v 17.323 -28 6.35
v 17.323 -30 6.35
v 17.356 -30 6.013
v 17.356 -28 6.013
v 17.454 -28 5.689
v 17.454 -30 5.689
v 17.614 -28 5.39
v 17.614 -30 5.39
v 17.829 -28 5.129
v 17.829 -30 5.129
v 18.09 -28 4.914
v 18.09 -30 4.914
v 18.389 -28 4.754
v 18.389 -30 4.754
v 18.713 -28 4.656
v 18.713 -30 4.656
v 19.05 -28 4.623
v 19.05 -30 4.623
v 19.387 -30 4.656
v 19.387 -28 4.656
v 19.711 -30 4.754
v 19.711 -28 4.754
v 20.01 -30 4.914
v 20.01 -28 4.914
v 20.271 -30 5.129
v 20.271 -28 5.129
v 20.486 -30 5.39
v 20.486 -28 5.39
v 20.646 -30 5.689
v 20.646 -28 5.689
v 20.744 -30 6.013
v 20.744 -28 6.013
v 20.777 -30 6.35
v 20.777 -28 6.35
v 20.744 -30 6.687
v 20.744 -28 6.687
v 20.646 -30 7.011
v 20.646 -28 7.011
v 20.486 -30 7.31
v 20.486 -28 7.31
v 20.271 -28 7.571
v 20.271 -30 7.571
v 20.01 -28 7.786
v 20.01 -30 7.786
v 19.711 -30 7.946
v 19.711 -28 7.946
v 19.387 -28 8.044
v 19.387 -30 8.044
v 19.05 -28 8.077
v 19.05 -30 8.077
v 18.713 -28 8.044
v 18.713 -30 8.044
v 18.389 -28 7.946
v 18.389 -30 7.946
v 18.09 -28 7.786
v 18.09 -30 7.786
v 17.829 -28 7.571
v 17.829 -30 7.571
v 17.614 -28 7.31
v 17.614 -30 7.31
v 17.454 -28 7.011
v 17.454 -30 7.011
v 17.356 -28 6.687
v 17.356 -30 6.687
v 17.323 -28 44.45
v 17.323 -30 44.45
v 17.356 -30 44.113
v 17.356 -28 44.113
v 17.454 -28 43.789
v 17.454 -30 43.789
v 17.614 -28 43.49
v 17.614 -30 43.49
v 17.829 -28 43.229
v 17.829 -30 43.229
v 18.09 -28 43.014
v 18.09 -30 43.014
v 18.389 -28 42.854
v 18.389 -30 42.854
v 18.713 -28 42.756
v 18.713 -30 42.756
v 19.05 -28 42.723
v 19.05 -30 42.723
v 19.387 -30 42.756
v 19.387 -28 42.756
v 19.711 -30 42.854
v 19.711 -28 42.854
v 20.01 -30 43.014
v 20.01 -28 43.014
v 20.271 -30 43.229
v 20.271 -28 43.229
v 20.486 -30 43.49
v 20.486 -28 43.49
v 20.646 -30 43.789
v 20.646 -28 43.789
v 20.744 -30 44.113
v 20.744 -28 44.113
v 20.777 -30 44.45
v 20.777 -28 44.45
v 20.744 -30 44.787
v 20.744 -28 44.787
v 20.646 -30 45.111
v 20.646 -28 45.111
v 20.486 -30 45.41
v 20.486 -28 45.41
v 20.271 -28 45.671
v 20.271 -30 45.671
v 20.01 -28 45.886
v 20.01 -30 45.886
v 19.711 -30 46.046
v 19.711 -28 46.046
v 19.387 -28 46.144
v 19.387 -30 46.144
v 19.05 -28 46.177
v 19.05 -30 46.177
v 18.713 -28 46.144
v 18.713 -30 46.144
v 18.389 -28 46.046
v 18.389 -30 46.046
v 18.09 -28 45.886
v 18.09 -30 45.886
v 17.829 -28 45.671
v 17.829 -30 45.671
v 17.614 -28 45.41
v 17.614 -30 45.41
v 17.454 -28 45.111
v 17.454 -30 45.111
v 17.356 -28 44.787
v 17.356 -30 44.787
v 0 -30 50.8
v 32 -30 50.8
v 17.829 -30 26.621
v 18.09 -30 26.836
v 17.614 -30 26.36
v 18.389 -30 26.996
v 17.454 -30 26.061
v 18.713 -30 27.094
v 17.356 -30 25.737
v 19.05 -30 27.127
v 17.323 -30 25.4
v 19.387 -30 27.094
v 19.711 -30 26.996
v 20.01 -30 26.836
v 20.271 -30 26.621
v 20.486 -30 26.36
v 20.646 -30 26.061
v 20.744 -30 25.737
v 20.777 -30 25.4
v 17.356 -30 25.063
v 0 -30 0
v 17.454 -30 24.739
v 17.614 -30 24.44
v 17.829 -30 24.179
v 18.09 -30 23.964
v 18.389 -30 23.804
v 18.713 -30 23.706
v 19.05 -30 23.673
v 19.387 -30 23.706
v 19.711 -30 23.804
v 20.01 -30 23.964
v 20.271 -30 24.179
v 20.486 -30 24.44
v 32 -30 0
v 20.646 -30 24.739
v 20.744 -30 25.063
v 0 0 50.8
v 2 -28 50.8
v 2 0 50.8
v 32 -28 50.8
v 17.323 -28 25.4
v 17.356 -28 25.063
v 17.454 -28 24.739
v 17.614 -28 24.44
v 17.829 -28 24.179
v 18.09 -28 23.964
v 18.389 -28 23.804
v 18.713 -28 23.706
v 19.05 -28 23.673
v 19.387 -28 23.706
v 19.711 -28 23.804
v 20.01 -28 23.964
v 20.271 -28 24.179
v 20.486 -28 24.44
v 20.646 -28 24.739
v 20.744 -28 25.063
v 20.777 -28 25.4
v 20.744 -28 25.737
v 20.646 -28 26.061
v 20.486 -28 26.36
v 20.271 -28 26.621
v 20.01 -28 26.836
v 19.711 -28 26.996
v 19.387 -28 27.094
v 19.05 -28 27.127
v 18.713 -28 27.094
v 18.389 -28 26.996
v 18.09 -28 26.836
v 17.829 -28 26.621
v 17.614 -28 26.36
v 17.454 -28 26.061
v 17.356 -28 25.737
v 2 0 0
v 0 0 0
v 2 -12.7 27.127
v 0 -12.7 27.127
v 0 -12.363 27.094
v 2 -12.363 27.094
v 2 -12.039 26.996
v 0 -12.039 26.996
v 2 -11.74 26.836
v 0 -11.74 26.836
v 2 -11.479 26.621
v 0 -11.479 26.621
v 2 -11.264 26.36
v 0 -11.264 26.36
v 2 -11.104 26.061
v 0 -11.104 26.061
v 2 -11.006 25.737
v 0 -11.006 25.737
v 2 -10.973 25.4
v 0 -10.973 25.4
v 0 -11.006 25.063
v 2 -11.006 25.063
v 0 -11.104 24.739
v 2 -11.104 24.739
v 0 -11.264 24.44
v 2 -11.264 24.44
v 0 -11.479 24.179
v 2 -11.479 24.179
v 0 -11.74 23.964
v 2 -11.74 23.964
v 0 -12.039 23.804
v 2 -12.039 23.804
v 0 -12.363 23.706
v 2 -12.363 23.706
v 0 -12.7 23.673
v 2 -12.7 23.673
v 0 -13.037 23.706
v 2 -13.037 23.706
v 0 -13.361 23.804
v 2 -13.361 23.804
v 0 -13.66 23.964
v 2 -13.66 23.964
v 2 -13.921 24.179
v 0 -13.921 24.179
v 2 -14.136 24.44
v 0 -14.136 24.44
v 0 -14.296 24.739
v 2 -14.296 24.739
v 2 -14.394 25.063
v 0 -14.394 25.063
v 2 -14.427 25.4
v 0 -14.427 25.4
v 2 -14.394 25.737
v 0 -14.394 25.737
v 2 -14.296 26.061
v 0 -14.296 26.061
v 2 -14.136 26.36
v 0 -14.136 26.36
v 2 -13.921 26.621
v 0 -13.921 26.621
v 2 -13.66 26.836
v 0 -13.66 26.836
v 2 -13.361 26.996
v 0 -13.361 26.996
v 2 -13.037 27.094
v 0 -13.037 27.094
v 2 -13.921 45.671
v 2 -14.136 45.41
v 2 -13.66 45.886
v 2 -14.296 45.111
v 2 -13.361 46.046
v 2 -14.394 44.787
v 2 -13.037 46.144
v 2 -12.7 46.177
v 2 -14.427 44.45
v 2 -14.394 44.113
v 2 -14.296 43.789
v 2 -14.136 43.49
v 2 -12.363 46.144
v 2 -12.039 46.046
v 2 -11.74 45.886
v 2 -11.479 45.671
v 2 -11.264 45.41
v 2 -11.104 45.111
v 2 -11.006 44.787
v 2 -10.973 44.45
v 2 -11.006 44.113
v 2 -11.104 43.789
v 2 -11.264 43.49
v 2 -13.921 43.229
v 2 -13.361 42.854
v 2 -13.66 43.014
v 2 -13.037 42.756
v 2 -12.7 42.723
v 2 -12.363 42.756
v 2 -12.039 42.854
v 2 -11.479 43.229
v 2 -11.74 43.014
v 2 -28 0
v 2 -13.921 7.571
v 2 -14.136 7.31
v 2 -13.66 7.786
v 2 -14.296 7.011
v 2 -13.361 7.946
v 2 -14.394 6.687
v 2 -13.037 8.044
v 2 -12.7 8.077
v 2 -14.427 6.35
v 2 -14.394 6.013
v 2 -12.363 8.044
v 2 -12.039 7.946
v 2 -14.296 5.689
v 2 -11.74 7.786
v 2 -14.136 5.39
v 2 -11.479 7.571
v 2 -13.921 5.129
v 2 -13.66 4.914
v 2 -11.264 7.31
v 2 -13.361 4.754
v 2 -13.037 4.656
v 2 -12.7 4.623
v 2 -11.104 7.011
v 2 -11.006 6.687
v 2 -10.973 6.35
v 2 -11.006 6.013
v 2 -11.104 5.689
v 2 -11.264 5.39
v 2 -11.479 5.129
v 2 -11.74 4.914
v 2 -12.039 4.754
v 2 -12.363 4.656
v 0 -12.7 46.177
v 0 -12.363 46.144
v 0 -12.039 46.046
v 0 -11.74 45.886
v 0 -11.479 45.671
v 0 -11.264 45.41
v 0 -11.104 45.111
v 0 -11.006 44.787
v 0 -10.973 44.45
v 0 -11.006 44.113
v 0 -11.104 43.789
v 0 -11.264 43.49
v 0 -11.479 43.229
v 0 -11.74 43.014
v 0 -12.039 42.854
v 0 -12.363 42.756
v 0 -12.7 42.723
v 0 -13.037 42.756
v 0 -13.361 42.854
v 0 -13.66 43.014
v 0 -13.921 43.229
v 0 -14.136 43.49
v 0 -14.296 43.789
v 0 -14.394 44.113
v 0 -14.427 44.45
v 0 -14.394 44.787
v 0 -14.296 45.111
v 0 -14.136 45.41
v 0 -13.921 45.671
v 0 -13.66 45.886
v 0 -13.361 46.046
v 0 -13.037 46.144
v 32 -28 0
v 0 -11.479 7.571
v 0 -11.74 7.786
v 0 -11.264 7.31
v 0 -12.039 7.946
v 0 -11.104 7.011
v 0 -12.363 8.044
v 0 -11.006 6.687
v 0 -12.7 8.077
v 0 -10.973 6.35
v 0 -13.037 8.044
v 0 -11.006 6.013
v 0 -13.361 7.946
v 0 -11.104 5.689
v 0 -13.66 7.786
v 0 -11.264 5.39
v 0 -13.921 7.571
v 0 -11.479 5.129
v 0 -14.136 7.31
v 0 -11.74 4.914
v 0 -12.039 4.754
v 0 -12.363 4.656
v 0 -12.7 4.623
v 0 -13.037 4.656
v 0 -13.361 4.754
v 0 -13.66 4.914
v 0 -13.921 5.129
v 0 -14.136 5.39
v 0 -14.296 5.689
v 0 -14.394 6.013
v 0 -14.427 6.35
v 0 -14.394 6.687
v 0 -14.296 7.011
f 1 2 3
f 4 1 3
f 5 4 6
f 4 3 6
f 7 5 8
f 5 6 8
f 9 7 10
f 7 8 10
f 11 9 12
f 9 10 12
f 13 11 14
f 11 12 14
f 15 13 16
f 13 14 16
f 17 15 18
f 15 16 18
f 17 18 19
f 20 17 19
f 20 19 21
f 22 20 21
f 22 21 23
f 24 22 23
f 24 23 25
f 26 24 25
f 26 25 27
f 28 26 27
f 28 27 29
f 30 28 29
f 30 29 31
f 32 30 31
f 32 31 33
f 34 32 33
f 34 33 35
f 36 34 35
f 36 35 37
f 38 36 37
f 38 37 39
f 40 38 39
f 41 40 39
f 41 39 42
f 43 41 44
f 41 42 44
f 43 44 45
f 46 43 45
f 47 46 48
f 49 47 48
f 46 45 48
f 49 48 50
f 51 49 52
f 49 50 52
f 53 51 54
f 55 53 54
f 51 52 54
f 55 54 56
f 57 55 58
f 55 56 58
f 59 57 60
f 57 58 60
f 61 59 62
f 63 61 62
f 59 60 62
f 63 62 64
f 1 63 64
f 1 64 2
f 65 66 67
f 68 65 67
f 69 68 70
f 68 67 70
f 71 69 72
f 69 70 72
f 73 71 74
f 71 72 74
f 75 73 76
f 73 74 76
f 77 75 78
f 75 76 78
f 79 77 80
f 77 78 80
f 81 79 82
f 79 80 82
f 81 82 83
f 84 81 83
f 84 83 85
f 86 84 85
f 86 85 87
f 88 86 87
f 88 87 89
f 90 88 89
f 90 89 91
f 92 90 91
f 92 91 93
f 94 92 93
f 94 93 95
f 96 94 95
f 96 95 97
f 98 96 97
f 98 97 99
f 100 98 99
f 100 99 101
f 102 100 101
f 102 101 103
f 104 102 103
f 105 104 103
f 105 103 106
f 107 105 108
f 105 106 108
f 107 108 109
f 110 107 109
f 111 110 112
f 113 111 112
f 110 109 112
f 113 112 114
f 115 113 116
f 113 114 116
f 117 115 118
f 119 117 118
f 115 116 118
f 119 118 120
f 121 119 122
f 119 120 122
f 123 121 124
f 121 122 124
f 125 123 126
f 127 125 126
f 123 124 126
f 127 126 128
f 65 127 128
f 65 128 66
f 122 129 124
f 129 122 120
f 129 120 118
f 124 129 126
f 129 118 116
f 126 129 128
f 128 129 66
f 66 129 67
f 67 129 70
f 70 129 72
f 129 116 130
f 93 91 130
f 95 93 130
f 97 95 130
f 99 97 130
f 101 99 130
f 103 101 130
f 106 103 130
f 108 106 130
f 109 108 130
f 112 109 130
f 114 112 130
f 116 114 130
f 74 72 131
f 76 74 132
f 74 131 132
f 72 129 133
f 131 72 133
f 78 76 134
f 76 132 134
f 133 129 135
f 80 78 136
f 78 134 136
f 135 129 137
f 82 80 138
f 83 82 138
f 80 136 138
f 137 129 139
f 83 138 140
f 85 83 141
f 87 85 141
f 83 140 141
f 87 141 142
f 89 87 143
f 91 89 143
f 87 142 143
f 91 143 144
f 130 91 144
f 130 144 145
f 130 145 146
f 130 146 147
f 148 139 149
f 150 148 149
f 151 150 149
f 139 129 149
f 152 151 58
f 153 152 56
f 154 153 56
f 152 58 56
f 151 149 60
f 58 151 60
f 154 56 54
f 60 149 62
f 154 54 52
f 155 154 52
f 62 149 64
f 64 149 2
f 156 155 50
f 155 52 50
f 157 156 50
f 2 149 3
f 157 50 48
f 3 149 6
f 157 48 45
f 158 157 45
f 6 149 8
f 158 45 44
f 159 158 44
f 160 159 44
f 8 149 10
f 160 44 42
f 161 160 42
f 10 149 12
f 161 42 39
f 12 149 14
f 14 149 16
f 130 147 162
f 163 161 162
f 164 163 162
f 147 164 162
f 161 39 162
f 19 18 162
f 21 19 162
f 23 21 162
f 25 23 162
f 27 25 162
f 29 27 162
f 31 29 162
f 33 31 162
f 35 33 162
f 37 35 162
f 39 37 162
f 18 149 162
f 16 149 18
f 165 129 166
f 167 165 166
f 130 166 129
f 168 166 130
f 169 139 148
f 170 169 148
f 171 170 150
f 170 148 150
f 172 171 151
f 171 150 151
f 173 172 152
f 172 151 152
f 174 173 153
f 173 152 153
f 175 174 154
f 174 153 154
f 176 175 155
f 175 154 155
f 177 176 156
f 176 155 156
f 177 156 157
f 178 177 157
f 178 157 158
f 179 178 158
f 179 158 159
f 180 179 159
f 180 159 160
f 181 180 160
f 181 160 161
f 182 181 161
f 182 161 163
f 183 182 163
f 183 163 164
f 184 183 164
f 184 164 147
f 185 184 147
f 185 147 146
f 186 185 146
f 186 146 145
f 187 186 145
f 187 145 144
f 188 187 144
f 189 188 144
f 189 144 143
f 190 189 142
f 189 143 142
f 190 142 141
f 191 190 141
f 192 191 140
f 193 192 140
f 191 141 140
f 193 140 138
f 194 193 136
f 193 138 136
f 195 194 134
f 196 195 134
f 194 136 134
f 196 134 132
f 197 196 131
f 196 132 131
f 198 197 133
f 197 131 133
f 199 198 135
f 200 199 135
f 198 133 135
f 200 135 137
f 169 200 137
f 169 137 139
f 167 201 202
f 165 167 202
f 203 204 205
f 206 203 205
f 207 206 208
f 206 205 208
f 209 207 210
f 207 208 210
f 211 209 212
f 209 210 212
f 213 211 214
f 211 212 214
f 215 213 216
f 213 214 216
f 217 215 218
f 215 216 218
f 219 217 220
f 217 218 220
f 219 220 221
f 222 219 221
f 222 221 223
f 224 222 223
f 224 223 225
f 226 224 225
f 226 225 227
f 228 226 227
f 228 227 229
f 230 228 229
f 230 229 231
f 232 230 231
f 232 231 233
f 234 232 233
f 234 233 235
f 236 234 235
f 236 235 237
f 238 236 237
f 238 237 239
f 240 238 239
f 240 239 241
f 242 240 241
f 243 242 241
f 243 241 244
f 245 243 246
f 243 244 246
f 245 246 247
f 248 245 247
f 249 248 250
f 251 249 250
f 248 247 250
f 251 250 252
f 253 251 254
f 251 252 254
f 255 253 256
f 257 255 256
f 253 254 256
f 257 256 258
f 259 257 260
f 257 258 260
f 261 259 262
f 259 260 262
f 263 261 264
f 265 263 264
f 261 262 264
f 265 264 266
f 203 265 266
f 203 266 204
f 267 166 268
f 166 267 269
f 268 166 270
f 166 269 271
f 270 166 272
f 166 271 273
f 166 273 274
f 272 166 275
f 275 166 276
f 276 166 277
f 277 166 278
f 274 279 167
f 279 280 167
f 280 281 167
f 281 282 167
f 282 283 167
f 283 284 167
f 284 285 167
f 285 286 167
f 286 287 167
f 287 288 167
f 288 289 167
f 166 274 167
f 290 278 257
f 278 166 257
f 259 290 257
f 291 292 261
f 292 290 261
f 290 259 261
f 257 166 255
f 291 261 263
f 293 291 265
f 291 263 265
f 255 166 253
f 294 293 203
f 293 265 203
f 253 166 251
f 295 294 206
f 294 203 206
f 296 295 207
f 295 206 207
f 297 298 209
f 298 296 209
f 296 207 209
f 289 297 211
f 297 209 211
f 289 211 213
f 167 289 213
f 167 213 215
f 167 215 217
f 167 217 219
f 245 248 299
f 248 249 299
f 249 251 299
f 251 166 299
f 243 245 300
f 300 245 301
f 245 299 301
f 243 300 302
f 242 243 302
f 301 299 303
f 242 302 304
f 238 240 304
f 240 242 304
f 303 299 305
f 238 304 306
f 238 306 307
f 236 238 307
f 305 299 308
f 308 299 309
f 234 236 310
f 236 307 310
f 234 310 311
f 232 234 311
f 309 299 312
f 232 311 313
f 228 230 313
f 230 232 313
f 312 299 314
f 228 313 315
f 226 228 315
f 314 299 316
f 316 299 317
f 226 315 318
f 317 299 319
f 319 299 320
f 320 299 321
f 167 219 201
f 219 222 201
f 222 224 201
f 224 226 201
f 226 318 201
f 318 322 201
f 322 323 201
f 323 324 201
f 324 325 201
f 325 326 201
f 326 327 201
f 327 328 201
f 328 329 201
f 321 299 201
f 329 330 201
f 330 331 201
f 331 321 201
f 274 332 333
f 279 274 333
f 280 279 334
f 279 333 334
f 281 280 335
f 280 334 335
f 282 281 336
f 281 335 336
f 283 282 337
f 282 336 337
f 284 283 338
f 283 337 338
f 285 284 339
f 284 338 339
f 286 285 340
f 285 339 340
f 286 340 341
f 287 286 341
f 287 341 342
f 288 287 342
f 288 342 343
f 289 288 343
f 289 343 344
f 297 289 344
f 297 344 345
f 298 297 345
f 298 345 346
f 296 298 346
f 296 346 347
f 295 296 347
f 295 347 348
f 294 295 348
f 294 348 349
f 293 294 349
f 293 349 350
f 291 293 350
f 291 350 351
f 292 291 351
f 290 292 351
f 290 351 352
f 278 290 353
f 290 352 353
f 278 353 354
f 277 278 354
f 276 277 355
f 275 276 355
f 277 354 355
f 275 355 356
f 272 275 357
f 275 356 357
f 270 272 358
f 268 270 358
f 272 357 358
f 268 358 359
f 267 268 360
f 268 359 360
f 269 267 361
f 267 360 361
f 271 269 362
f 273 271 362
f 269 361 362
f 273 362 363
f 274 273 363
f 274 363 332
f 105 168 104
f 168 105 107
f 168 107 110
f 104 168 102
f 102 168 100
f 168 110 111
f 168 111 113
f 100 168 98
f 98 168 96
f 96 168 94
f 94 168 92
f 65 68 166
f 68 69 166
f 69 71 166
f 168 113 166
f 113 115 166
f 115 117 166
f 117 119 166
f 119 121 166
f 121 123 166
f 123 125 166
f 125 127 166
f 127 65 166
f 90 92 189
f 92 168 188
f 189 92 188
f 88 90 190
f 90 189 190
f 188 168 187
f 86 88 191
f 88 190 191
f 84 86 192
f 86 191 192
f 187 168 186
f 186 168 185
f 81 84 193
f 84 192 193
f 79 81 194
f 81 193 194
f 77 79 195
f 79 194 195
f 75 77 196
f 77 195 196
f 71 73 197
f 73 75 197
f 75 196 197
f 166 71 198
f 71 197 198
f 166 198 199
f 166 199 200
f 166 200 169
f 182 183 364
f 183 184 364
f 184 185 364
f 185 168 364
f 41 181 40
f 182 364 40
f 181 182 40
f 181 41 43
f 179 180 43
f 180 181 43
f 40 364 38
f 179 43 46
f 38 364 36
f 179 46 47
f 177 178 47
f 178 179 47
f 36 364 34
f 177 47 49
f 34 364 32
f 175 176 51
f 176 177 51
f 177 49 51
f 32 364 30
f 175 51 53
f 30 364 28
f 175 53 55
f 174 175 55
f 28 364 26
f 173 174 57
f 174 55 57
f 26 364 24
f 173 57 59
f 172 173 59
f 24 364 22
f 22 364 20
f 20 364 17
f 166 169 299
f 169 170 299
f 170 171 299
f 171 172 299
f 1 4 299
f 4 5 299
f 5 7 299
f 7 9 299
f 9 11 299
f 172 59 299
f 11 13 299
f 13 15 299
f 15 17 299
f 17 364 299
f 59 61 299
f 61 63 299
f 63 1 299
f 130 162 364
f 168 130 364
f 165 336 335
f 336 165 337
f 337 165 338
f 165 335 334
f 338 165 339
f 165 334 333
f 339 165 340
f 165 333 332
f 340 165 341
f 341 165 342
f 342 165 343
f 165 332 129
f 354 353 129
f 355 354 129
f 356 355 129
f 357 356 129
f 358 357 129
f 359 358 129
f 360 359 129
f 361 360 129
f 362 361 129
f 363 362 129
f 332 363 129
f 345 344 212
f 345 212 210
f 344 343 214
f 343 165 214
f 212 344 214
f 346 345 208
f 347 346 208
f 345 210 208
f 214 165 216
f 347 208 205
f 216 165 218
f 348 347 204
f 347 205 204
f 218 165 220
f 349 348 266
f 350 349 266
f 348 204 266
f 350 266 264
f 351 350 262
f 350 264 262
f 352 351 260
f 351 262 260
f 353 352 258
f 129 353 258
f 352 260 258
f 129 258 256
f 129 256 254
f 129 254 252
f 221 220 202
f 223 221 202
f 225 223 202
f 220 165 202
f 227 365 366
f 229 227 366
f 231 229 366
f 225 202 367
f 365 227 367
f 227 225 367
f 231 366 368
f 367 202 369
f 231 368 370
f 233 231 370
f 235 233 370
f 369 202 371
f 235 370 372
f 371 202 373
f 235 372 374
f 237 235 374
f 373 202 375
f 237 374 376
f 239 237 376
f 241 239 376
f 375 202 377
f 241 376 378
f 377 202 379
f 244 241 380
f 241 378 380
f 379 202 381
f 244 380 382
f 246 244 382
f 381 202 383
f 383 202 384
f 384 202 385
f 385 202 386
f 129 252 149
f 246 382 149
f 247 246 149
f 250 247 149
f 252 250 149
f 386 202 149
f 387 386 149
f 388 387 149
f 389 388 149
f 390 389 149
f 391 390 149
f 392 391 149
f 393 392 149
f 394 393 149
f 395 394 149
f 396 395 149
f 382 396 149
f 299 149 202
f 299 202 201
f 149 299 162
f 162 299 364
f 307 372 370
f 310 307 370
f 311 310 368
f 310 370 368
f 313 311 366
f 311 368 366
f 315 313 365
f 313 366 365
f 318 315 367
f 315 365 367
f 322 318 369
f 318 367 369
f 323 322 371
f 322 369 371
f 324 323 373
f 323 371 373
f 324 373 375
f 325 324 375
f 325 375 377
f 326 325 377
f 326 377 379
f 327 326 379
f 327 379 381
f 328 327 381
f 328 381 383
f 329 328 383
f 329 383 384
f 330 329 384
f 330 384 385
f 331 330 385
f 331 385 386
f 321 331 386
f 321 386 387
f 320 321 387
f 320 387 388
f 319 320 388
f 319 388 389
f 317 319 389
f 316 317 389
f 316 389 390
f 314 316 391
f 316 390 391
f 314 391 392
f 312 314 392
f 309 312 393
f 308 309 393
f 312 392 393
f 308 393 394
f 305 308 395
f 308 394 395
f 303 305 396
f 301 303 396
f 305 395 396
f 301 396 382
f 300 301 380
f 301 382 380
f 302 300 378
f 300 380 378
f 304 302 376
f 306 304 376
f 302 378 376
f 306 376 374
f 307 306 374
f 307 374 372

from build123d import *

# Parameters (mm, degrees)
BOSS_EXTRUDE1_DEPTH       = 50.8
TAP_DRILL_FOR_8_32_TAP1_D = 3.4544
TAP_DRILL_FOR_8_32_TAP2_D = 3.4544


with BuildPart() as part:
    # Sketch1 → Boss-Extrude1 (new body)
    with BuildSketch(Plane.XY):
        Polygon((0, 0), (0, -30), (32, -30), (32, -28), (2, -28), (2, 0), align=None)
    extrude(amount=BOSS_EXTRUDE1_DEPTH)

    # Tap Drill for #8-32 Tap1 (through all)
    with Locations(Plane(origin=(0, -28, 0), x_dir=(1, 0, 0), z_dir=(0, 1, 0))):
        with Locations((19.05, -6.35), (19.05, -44.45), (19.05, -25.4)):
            Hole(TAP_DRILL_FOR_8_32_TAP1_D / 2)

    # Tap Drill for #8-32 Tap2 (through all)
    with Locations(Plane(origin=(2, 0, 0), x_dir=(0, 0, -1), z_dir=(1, 0, 0))):
        with Locations((-44.45, -12.7), (-6.35, -12.7), (-25.4, -12.7)):
            Hole(TAP_DRILL_FOR_8_32_TAP2_D / 2)


solid = part.part
